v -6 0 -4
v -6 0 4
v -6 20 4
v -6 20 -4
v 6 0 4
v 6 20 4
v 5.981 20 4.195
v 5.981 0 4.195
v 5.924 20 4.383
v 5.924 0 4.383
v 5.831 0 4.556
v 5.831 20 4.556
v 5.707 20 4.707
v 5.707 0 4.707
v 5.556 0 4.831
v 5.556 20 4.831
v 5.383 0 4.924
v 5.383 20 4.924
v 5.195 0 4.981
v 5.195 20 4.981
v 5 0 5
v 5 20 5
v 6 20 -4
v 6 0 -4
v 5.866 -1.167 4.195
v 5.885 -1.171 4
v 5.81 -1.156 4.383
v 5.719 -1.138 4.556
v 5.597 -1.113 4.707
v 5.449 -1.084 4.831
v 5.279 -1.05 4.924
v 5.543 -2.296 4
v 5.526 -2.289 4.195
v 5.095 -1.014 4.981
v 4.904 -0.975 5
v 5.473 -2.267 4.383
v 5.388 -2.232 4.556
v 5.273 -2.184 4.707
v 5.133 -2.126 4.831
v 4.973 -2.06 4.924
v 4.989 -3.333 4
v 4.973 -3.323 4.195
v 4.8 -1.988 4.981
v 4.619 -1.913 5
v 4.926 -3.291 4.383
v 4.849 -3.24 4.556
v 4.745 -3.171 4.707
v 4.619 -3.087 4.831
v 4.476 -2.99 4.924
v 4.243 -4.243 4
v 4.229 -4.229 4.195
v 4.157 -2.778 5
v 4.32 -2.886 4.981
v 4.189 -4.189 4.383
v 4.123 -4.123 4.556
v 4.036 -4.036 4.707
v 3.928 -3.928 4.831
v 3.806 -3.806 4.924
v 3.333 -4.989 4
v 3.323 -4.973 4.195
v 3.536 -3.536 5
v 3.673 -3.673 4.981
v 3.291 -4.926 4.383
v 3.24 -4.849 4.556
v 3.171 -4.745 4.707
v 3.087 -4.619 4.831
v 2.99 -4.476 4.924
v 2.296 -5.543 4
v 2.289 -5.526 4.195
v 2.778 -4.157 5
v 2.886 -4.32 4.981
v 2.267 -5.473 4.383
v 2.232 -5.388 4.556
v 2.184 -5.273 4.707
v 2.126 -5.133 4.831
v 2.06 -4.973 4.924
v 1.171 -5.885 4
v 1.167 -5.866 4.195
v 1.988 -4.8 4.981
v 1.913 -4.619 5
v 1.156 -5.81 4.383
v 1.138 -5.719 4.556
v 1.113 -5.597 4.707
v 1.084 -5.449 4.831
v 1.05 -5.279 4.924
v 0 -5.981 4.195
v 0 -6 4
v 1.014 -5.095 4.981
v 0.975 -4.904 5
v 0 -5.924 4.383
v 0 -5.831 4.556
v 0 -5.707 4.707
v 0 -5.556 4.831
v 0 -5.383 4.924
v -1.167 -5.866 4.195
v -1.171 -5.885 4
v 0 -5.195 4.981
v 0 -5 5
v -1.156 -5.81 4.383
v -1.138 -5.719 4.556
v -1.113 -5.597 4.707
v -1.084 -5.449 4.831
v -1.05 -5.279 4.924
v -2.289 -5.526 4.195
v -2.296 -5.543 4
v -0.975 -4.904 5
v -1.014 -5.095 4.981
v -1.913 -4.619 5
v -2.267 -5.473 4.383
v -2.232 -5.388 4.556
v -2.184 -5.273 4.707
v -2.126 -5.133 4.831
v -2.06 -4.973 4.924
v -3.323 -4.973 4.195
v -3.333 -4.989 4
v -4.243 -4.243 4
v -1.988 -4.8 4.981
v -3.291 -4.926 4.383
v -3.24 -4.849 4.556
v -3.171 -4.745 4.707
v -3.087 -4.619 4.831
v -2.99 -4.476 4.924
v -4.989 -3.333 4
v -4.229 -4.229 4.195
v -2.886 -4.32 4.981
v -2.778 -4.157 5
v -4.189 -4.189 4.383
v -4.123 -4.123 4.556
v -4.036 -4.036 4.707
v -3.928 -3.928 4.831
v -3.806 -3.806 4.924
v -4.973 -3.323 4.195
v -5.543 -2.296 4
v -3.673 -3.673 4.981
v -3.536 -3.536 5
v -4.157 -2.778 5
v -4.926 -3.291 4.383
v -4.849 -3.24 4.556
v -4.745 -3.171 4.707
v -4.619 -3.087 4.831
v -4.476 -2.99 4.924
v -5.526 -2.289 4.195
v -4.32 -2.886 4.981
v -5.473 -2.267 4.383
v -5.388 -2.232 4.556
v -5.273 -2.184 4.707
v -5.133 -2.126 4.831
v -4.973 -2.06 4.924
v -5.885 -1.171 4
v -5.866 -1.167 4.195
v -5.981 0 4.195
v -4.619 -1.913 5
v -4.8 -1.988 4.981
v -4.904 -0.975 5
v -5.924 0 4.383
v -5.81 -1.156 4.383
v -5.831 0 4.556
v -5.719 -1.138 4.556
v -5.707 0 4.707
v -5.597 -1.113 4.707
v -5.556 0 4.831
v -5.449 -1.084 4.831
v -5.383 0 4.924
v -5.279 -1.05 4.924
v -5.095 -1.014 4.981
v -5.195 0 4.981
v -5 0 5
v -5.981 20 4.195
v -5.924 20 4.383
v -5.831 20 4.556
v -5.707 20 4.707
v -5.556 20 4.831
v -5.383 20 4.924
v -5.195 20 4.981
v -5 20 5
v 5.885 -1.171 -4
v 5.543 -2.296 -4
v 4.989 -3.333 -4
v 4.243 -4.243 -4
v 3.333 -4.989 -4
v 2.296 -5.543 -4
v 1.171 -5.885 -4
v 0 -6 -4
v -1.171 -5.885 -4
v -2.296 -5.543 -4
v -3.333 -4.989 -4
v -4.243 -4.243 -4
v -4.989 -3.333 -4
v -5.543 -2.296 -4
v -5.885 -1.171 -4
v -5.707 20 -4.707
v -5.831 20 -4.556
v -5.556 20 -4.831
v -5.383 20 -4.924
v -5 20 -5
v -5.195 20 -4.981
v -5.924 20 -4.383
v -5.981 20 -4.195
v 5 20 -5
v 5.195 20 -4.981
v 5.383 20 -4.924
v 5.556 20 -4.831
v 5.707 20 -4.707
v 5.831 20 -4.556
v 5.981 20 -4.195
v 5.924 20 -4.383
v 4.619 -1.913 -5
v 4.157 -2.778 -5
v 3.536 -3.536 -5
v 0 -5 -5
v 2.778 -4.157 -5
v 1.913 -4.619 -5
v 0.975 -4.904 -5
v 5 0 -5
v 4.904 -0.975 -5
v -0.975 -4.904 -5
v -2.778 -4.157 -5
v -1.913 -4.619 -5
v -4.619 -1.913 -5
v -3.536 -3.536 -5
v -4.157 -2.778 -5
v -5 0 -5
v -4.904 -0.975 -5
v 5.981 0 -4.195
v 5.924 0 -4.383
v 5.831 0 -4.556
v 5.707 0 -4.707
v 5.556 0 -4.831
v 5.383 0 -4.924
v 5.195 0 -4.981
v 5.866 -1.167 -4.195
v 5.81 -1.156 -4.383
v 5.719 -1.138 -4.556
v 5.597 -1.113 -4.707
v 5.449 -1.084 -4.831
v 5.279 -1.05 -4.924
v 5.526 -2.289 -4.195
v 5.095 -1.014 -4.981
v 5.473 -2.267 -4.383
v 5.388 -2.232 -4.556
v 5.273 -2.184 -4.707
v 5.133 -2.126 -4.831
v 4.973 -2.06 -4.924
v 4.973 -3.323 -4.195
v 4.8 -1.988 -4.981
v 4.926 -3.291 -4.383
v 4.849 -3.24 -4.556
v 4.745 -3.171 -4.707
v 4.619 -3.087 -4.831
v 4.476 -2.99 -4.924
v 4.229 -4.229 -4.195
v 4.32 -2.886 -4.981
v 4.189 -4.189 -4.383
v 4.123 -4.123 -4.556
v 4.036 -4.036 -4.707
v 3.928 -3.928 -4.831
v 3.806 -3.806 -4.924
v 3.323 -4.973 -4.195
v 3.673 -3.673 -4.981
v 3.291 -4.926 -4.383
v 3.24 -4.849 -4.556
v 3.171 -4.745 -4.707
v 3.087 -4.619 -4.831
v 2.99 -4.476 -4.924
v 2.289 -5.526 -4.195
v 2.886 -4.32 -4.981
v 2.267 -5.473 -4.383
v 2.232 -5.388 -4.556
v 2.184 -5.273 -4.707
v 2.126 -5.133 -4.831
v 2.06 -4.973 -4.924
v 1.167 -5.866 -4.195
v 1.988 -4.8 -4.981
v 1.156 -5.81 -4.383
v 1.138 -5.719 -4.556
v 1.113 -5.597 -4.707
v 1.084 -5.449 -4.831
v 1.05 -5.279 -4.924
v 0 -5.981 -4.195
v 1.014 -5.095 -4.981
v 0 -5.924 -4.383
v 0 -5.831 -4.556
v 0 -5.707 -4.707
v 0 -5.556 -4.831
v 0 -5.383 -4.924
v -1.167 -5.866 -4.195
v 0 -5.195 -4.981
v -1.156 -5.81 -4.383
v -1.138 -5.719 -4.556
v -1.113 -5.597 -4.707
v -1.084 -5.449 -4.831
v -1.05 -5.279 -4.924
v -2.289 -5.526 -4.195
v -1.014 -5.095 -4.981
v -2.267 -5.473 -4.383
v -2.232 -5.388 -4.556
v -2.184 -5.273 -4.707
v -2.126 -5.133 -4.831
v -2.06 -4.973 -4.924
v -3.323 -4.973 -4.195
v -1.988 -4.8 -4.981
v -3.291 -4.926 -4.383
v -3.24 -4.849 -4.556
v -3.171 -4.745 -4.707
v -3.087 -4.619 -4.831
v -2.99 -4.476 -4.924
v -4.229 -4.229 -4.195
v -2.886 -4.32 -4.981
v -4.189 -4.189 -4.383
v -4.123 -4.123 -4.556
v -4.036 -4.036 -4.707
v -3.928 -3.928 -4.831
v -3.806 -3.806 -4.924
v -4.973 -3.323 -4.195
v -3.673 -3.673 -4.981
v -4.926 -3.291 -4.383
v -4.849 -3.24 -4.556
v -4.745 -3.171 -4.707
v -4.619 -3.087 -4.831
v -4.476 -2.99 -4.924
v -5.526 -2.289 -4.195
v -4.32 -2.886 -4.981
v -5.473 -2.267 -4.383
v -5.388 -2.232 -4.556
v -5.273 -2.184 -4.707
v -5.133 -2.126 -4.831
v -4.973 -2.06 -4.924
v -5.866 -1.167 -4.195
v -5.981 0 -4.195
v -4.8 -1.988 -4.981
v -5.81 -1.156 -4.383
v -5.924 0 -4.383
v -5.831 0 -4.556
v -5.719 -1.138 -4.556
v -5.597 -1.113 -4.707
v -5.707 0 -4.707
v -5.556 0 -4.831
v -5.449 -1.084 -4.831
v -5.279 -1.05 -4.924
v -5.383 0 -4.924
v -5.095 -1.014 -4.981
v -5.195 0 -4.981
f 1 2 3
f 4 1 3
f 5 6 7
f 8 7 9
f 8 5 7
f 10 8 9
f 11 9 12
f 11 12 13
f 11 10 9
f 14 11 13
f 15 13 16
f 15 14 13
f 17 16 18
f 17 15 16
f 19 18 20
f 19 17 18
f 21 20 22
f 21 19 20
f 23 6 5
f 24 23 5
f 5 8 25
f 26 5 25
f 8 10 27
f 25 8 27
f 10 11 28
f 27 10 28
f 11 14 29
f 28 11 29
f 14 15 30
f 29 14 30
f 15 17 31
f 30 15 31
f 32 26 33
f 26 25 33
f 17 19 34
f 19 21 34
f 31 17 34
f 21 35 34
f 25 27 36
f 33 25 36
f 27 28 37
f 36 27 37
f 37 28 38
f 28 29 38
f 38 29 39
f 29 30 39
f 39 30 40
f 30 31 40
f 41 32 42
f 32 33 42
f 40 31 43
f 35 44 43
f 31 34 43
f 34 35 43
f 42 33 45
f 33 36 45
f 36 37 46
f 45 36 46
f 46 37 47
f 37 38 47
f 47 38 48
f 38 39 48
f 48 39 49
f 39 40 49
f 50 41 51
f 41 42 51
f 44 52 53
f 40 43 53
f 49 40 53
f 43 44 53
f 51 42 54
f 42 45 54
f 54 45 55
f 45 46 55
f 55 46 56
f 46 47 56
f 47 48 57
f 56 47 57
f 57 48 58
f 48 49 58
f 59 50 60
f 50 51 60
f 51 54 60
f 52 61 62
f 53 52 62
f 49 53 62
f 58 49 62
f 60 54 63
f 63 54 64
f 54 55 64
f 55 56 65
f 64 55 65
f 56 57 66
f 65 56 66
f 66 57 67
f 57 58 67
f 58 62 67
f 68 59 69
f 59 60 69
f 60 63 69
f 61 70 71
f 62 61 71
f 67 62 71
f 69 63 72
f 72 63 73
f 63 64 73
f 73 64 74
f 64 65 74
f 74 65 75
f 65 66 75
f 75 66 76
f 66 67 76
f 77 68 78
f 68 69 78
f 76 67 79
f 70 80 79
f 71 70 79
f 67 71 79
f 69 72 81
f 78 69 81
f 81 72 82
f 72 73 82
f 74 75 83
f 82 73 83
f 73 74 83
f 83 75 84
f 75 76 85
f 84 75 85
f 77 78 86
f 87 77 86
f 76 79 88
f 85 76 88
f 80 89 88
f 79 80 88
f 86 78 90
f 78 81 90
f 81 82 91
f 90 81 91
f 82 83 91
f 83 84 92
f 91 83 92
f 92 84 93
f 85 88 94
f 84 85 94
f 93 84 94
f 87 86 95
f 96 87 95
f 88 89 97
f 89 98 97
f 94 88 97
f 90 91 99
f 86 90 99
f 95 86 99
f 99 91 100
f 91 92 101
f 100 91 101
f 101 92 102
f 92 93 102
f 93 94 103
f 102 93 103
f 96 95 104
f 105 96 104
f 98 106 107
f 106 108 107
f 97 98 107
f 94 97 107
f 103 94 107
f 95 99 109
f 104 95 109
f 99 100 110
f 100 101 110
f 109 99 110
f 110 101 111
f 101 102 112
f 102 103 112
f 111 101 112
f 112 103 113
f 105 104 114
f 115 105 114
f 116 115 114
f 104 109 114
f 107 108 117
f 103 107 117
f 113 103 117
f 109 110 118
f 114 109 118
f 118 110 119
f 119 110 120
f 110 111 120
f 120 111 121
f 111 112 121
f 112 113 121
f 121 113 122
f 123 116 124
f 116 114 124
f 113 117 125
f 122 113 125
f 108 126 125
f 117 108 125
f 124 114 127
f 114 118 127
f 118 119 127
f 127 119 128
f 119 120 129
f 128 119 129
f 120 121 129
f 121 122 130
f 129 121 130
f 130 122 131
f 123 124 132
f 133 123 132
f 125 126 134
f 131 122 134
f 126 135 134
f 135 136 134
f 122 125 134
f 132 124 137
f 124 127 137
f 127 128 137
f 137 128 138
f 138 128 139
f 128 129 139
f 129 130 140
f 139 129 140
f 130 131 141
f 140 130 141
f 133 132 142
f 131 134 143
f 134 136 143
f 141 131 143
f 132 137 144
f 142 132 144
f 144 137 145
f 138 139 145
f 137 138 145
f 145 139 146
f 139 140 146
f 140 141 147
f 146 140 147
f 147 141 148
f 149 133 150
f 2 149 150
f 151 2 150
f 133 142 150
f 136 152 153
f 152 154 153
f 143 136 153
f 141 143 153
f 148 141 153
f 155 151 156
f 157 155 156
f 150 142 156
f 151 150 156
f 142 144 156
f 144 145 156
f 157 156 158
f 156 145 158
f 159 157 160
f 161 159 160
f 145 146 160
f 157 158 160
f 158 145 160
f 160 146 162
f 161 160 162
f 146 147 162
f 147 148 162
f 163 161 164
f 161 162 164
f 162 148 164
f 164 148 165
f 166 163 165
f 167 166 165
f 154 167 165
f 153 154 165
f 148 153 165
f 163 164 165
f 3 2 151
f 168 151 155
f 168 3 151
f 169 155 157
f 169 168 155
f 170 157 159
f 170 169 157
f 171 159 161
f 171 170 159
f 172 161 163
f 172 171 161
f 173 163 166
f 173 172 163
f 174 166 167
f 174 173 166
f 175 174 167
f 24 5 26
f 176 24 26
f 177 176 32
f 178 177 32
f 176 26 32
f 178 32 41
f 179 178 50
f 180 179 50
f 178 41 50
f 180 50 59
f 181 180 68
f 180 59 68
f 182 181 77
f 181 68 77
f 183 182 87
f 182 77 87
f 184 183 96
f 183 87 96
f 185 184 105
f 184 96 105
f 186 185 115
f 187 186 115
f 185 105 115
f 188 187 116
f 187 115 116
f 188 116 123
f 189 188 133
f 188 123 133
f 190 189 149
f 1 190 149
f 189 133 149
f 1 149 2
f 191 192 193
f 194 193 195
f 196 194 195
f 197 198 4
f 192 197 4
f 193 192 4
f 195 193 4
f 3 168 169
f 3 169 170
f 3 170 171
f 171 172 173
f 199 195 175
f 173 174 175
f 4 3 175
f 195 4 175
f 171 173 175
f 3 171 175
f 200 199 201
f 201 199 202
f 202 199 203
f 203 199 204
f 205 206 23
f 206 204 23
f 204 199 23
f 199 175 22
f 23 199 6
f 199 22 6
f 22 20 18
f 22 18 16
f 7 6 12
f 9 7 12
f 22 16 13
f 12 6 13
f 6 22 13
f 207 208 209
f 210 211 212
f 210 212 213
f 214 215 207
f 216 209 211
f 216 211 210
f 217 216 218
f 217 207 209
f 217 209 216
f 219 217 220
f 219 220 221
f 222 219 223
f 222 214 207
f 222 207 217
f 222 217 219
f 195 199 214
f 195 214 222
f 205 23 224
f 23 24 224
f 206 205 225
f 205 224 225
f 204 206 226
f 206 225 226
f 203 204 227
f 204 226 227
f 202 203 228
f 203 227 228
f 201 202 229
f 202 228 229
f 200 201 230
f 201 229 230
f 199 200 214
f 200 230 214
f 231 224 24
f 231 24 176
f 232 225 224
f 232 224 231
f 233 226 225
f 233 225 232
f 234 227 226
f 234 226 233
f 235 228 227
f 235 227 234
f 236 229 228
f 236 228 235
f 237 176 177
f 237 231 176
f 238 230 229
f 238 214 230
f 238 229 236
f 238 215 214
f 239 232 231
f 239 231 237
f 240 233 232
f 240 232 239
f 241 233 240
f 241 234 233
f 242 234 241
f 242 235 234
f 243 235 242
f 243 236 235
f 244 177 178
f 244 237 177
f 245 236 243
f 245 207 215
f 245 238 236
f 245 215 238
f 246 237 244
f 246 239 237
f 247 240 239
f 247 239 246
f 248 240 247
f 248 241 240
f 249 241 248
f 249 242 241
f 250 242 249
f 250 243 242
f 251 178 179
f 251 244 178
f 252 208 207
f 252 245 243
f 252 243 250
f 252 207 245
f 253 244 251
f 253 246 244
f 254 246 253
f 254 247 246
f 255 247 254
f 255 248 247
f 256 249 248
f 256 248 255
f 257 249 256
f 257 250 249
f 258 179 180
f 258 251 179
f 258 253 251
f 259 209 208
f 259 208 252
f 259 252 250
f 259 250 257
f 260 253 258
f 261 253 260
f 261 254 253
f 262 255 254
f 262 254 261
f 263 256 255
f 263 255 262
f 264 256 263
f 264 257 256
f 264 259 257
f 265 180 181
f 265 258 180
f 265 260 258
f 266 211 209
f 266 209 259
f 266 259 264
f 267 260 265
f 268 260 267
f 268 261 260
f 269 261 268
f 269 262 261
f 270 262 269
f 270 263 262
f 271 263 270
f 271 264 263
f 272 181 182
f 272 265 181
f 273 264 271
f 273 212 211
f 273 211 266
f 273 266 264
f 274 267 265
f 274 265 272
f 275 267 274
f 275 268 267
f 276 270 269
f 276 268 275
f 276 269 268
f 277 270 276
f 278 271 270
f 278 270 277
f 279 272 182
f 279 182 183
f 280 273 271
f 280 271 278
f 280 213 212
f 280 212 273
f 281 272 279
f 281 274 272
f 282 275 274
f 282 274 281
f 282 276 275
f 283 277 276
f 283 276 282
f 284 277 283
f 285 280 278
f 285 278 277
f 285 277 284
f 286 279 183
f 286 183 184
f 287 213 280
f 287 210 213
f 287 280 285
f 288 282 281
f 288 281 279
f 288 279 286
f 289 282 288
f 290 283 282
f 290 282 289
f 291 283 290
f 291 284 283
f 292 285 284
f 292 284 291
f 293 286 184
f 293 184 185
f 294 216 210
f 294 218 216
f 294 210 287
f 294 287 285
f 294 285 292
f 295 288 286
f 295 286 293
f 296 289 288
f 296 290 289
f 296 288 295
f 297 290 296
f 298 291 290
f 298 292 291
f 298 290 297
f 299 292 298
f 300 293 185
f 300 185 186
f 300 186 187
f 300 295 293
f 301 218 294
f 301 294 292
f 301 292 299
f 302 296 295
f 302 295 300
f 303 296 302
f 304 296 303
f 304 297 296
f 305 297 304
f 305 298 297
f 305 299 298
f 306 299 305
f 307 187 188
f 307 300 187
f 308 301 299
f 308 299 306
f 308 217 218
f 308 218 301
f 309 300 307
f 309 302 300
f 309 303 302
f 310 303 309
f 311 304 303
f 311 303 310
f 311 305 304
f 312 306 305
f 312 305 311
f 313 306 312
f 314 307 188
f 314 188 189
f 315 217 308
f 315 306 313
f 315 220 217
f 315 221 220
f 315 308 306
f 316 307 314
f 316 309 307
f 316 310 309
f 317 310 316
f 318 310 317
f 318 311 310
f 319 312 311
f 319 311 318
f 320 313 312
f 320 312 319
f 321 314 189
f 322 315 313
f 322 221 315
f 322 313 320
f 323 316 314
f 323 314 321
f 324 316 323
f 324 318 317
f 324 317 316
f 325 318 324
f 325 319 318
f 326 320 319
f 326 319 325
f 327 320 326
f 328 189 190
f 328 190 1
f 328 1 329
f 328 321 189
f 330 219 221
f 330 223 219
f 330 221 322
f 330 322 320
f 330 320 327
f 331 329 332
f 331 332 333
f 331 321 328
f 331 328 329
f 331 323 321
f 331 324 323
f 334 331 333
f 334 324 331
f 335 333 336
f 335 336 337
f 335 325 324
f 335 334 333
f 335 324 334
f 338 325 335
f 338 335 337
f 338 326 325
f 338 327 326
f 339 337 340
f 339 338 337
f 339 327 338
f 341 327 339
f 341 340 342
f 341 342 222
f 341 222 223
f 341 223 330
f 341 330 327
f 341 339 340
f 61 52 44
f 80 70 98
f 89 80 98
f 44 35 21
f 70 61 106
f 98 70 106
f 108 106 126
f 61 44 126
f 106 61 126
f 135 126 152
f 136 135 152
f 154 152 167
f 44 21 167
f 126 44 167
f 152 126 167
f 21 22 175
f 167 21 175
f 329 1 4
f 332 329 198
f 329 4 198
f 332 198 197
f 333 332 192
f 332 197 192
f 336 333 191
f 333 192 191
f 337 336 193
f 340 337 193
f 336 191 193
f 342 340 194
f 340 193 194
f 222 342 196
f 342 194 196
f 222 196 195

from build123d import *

# Parameters (mm, degrees)
BOSS_EXTRUDE1_DEPTH = 5
FILLET1_R           = 1


with BuildPart() as part:
    # Sketch2 → Boss-Extrude1 (new, symmetric)
    with BuildSketch(Plane.XY):
        with BuildLine():
            Line((-6, 0), (-6, 20))
            Line((-6, 20), (6, 20))
            Line((6, 20), (6, 0))
            ThreePointArc((6, 0), (0, -6), (-6, 0))
        make_face()
    extrude(amount=BOSS_EXTRUDE1_DEPTH, both=True)

    # Fillet1
    fillet1_edges = [part.edges().sort_by_distance(p)[0] for p in [
        (-6, 10, 5),
        (0, -6, 5),
        (-6, 10, -5),
        (6, 10, -5),
        (0, -6, -5),
        (6, 10, 5),
    ]]
    fillet(fillet1_edges, radius=FILLET1_R)


solid = part.part
